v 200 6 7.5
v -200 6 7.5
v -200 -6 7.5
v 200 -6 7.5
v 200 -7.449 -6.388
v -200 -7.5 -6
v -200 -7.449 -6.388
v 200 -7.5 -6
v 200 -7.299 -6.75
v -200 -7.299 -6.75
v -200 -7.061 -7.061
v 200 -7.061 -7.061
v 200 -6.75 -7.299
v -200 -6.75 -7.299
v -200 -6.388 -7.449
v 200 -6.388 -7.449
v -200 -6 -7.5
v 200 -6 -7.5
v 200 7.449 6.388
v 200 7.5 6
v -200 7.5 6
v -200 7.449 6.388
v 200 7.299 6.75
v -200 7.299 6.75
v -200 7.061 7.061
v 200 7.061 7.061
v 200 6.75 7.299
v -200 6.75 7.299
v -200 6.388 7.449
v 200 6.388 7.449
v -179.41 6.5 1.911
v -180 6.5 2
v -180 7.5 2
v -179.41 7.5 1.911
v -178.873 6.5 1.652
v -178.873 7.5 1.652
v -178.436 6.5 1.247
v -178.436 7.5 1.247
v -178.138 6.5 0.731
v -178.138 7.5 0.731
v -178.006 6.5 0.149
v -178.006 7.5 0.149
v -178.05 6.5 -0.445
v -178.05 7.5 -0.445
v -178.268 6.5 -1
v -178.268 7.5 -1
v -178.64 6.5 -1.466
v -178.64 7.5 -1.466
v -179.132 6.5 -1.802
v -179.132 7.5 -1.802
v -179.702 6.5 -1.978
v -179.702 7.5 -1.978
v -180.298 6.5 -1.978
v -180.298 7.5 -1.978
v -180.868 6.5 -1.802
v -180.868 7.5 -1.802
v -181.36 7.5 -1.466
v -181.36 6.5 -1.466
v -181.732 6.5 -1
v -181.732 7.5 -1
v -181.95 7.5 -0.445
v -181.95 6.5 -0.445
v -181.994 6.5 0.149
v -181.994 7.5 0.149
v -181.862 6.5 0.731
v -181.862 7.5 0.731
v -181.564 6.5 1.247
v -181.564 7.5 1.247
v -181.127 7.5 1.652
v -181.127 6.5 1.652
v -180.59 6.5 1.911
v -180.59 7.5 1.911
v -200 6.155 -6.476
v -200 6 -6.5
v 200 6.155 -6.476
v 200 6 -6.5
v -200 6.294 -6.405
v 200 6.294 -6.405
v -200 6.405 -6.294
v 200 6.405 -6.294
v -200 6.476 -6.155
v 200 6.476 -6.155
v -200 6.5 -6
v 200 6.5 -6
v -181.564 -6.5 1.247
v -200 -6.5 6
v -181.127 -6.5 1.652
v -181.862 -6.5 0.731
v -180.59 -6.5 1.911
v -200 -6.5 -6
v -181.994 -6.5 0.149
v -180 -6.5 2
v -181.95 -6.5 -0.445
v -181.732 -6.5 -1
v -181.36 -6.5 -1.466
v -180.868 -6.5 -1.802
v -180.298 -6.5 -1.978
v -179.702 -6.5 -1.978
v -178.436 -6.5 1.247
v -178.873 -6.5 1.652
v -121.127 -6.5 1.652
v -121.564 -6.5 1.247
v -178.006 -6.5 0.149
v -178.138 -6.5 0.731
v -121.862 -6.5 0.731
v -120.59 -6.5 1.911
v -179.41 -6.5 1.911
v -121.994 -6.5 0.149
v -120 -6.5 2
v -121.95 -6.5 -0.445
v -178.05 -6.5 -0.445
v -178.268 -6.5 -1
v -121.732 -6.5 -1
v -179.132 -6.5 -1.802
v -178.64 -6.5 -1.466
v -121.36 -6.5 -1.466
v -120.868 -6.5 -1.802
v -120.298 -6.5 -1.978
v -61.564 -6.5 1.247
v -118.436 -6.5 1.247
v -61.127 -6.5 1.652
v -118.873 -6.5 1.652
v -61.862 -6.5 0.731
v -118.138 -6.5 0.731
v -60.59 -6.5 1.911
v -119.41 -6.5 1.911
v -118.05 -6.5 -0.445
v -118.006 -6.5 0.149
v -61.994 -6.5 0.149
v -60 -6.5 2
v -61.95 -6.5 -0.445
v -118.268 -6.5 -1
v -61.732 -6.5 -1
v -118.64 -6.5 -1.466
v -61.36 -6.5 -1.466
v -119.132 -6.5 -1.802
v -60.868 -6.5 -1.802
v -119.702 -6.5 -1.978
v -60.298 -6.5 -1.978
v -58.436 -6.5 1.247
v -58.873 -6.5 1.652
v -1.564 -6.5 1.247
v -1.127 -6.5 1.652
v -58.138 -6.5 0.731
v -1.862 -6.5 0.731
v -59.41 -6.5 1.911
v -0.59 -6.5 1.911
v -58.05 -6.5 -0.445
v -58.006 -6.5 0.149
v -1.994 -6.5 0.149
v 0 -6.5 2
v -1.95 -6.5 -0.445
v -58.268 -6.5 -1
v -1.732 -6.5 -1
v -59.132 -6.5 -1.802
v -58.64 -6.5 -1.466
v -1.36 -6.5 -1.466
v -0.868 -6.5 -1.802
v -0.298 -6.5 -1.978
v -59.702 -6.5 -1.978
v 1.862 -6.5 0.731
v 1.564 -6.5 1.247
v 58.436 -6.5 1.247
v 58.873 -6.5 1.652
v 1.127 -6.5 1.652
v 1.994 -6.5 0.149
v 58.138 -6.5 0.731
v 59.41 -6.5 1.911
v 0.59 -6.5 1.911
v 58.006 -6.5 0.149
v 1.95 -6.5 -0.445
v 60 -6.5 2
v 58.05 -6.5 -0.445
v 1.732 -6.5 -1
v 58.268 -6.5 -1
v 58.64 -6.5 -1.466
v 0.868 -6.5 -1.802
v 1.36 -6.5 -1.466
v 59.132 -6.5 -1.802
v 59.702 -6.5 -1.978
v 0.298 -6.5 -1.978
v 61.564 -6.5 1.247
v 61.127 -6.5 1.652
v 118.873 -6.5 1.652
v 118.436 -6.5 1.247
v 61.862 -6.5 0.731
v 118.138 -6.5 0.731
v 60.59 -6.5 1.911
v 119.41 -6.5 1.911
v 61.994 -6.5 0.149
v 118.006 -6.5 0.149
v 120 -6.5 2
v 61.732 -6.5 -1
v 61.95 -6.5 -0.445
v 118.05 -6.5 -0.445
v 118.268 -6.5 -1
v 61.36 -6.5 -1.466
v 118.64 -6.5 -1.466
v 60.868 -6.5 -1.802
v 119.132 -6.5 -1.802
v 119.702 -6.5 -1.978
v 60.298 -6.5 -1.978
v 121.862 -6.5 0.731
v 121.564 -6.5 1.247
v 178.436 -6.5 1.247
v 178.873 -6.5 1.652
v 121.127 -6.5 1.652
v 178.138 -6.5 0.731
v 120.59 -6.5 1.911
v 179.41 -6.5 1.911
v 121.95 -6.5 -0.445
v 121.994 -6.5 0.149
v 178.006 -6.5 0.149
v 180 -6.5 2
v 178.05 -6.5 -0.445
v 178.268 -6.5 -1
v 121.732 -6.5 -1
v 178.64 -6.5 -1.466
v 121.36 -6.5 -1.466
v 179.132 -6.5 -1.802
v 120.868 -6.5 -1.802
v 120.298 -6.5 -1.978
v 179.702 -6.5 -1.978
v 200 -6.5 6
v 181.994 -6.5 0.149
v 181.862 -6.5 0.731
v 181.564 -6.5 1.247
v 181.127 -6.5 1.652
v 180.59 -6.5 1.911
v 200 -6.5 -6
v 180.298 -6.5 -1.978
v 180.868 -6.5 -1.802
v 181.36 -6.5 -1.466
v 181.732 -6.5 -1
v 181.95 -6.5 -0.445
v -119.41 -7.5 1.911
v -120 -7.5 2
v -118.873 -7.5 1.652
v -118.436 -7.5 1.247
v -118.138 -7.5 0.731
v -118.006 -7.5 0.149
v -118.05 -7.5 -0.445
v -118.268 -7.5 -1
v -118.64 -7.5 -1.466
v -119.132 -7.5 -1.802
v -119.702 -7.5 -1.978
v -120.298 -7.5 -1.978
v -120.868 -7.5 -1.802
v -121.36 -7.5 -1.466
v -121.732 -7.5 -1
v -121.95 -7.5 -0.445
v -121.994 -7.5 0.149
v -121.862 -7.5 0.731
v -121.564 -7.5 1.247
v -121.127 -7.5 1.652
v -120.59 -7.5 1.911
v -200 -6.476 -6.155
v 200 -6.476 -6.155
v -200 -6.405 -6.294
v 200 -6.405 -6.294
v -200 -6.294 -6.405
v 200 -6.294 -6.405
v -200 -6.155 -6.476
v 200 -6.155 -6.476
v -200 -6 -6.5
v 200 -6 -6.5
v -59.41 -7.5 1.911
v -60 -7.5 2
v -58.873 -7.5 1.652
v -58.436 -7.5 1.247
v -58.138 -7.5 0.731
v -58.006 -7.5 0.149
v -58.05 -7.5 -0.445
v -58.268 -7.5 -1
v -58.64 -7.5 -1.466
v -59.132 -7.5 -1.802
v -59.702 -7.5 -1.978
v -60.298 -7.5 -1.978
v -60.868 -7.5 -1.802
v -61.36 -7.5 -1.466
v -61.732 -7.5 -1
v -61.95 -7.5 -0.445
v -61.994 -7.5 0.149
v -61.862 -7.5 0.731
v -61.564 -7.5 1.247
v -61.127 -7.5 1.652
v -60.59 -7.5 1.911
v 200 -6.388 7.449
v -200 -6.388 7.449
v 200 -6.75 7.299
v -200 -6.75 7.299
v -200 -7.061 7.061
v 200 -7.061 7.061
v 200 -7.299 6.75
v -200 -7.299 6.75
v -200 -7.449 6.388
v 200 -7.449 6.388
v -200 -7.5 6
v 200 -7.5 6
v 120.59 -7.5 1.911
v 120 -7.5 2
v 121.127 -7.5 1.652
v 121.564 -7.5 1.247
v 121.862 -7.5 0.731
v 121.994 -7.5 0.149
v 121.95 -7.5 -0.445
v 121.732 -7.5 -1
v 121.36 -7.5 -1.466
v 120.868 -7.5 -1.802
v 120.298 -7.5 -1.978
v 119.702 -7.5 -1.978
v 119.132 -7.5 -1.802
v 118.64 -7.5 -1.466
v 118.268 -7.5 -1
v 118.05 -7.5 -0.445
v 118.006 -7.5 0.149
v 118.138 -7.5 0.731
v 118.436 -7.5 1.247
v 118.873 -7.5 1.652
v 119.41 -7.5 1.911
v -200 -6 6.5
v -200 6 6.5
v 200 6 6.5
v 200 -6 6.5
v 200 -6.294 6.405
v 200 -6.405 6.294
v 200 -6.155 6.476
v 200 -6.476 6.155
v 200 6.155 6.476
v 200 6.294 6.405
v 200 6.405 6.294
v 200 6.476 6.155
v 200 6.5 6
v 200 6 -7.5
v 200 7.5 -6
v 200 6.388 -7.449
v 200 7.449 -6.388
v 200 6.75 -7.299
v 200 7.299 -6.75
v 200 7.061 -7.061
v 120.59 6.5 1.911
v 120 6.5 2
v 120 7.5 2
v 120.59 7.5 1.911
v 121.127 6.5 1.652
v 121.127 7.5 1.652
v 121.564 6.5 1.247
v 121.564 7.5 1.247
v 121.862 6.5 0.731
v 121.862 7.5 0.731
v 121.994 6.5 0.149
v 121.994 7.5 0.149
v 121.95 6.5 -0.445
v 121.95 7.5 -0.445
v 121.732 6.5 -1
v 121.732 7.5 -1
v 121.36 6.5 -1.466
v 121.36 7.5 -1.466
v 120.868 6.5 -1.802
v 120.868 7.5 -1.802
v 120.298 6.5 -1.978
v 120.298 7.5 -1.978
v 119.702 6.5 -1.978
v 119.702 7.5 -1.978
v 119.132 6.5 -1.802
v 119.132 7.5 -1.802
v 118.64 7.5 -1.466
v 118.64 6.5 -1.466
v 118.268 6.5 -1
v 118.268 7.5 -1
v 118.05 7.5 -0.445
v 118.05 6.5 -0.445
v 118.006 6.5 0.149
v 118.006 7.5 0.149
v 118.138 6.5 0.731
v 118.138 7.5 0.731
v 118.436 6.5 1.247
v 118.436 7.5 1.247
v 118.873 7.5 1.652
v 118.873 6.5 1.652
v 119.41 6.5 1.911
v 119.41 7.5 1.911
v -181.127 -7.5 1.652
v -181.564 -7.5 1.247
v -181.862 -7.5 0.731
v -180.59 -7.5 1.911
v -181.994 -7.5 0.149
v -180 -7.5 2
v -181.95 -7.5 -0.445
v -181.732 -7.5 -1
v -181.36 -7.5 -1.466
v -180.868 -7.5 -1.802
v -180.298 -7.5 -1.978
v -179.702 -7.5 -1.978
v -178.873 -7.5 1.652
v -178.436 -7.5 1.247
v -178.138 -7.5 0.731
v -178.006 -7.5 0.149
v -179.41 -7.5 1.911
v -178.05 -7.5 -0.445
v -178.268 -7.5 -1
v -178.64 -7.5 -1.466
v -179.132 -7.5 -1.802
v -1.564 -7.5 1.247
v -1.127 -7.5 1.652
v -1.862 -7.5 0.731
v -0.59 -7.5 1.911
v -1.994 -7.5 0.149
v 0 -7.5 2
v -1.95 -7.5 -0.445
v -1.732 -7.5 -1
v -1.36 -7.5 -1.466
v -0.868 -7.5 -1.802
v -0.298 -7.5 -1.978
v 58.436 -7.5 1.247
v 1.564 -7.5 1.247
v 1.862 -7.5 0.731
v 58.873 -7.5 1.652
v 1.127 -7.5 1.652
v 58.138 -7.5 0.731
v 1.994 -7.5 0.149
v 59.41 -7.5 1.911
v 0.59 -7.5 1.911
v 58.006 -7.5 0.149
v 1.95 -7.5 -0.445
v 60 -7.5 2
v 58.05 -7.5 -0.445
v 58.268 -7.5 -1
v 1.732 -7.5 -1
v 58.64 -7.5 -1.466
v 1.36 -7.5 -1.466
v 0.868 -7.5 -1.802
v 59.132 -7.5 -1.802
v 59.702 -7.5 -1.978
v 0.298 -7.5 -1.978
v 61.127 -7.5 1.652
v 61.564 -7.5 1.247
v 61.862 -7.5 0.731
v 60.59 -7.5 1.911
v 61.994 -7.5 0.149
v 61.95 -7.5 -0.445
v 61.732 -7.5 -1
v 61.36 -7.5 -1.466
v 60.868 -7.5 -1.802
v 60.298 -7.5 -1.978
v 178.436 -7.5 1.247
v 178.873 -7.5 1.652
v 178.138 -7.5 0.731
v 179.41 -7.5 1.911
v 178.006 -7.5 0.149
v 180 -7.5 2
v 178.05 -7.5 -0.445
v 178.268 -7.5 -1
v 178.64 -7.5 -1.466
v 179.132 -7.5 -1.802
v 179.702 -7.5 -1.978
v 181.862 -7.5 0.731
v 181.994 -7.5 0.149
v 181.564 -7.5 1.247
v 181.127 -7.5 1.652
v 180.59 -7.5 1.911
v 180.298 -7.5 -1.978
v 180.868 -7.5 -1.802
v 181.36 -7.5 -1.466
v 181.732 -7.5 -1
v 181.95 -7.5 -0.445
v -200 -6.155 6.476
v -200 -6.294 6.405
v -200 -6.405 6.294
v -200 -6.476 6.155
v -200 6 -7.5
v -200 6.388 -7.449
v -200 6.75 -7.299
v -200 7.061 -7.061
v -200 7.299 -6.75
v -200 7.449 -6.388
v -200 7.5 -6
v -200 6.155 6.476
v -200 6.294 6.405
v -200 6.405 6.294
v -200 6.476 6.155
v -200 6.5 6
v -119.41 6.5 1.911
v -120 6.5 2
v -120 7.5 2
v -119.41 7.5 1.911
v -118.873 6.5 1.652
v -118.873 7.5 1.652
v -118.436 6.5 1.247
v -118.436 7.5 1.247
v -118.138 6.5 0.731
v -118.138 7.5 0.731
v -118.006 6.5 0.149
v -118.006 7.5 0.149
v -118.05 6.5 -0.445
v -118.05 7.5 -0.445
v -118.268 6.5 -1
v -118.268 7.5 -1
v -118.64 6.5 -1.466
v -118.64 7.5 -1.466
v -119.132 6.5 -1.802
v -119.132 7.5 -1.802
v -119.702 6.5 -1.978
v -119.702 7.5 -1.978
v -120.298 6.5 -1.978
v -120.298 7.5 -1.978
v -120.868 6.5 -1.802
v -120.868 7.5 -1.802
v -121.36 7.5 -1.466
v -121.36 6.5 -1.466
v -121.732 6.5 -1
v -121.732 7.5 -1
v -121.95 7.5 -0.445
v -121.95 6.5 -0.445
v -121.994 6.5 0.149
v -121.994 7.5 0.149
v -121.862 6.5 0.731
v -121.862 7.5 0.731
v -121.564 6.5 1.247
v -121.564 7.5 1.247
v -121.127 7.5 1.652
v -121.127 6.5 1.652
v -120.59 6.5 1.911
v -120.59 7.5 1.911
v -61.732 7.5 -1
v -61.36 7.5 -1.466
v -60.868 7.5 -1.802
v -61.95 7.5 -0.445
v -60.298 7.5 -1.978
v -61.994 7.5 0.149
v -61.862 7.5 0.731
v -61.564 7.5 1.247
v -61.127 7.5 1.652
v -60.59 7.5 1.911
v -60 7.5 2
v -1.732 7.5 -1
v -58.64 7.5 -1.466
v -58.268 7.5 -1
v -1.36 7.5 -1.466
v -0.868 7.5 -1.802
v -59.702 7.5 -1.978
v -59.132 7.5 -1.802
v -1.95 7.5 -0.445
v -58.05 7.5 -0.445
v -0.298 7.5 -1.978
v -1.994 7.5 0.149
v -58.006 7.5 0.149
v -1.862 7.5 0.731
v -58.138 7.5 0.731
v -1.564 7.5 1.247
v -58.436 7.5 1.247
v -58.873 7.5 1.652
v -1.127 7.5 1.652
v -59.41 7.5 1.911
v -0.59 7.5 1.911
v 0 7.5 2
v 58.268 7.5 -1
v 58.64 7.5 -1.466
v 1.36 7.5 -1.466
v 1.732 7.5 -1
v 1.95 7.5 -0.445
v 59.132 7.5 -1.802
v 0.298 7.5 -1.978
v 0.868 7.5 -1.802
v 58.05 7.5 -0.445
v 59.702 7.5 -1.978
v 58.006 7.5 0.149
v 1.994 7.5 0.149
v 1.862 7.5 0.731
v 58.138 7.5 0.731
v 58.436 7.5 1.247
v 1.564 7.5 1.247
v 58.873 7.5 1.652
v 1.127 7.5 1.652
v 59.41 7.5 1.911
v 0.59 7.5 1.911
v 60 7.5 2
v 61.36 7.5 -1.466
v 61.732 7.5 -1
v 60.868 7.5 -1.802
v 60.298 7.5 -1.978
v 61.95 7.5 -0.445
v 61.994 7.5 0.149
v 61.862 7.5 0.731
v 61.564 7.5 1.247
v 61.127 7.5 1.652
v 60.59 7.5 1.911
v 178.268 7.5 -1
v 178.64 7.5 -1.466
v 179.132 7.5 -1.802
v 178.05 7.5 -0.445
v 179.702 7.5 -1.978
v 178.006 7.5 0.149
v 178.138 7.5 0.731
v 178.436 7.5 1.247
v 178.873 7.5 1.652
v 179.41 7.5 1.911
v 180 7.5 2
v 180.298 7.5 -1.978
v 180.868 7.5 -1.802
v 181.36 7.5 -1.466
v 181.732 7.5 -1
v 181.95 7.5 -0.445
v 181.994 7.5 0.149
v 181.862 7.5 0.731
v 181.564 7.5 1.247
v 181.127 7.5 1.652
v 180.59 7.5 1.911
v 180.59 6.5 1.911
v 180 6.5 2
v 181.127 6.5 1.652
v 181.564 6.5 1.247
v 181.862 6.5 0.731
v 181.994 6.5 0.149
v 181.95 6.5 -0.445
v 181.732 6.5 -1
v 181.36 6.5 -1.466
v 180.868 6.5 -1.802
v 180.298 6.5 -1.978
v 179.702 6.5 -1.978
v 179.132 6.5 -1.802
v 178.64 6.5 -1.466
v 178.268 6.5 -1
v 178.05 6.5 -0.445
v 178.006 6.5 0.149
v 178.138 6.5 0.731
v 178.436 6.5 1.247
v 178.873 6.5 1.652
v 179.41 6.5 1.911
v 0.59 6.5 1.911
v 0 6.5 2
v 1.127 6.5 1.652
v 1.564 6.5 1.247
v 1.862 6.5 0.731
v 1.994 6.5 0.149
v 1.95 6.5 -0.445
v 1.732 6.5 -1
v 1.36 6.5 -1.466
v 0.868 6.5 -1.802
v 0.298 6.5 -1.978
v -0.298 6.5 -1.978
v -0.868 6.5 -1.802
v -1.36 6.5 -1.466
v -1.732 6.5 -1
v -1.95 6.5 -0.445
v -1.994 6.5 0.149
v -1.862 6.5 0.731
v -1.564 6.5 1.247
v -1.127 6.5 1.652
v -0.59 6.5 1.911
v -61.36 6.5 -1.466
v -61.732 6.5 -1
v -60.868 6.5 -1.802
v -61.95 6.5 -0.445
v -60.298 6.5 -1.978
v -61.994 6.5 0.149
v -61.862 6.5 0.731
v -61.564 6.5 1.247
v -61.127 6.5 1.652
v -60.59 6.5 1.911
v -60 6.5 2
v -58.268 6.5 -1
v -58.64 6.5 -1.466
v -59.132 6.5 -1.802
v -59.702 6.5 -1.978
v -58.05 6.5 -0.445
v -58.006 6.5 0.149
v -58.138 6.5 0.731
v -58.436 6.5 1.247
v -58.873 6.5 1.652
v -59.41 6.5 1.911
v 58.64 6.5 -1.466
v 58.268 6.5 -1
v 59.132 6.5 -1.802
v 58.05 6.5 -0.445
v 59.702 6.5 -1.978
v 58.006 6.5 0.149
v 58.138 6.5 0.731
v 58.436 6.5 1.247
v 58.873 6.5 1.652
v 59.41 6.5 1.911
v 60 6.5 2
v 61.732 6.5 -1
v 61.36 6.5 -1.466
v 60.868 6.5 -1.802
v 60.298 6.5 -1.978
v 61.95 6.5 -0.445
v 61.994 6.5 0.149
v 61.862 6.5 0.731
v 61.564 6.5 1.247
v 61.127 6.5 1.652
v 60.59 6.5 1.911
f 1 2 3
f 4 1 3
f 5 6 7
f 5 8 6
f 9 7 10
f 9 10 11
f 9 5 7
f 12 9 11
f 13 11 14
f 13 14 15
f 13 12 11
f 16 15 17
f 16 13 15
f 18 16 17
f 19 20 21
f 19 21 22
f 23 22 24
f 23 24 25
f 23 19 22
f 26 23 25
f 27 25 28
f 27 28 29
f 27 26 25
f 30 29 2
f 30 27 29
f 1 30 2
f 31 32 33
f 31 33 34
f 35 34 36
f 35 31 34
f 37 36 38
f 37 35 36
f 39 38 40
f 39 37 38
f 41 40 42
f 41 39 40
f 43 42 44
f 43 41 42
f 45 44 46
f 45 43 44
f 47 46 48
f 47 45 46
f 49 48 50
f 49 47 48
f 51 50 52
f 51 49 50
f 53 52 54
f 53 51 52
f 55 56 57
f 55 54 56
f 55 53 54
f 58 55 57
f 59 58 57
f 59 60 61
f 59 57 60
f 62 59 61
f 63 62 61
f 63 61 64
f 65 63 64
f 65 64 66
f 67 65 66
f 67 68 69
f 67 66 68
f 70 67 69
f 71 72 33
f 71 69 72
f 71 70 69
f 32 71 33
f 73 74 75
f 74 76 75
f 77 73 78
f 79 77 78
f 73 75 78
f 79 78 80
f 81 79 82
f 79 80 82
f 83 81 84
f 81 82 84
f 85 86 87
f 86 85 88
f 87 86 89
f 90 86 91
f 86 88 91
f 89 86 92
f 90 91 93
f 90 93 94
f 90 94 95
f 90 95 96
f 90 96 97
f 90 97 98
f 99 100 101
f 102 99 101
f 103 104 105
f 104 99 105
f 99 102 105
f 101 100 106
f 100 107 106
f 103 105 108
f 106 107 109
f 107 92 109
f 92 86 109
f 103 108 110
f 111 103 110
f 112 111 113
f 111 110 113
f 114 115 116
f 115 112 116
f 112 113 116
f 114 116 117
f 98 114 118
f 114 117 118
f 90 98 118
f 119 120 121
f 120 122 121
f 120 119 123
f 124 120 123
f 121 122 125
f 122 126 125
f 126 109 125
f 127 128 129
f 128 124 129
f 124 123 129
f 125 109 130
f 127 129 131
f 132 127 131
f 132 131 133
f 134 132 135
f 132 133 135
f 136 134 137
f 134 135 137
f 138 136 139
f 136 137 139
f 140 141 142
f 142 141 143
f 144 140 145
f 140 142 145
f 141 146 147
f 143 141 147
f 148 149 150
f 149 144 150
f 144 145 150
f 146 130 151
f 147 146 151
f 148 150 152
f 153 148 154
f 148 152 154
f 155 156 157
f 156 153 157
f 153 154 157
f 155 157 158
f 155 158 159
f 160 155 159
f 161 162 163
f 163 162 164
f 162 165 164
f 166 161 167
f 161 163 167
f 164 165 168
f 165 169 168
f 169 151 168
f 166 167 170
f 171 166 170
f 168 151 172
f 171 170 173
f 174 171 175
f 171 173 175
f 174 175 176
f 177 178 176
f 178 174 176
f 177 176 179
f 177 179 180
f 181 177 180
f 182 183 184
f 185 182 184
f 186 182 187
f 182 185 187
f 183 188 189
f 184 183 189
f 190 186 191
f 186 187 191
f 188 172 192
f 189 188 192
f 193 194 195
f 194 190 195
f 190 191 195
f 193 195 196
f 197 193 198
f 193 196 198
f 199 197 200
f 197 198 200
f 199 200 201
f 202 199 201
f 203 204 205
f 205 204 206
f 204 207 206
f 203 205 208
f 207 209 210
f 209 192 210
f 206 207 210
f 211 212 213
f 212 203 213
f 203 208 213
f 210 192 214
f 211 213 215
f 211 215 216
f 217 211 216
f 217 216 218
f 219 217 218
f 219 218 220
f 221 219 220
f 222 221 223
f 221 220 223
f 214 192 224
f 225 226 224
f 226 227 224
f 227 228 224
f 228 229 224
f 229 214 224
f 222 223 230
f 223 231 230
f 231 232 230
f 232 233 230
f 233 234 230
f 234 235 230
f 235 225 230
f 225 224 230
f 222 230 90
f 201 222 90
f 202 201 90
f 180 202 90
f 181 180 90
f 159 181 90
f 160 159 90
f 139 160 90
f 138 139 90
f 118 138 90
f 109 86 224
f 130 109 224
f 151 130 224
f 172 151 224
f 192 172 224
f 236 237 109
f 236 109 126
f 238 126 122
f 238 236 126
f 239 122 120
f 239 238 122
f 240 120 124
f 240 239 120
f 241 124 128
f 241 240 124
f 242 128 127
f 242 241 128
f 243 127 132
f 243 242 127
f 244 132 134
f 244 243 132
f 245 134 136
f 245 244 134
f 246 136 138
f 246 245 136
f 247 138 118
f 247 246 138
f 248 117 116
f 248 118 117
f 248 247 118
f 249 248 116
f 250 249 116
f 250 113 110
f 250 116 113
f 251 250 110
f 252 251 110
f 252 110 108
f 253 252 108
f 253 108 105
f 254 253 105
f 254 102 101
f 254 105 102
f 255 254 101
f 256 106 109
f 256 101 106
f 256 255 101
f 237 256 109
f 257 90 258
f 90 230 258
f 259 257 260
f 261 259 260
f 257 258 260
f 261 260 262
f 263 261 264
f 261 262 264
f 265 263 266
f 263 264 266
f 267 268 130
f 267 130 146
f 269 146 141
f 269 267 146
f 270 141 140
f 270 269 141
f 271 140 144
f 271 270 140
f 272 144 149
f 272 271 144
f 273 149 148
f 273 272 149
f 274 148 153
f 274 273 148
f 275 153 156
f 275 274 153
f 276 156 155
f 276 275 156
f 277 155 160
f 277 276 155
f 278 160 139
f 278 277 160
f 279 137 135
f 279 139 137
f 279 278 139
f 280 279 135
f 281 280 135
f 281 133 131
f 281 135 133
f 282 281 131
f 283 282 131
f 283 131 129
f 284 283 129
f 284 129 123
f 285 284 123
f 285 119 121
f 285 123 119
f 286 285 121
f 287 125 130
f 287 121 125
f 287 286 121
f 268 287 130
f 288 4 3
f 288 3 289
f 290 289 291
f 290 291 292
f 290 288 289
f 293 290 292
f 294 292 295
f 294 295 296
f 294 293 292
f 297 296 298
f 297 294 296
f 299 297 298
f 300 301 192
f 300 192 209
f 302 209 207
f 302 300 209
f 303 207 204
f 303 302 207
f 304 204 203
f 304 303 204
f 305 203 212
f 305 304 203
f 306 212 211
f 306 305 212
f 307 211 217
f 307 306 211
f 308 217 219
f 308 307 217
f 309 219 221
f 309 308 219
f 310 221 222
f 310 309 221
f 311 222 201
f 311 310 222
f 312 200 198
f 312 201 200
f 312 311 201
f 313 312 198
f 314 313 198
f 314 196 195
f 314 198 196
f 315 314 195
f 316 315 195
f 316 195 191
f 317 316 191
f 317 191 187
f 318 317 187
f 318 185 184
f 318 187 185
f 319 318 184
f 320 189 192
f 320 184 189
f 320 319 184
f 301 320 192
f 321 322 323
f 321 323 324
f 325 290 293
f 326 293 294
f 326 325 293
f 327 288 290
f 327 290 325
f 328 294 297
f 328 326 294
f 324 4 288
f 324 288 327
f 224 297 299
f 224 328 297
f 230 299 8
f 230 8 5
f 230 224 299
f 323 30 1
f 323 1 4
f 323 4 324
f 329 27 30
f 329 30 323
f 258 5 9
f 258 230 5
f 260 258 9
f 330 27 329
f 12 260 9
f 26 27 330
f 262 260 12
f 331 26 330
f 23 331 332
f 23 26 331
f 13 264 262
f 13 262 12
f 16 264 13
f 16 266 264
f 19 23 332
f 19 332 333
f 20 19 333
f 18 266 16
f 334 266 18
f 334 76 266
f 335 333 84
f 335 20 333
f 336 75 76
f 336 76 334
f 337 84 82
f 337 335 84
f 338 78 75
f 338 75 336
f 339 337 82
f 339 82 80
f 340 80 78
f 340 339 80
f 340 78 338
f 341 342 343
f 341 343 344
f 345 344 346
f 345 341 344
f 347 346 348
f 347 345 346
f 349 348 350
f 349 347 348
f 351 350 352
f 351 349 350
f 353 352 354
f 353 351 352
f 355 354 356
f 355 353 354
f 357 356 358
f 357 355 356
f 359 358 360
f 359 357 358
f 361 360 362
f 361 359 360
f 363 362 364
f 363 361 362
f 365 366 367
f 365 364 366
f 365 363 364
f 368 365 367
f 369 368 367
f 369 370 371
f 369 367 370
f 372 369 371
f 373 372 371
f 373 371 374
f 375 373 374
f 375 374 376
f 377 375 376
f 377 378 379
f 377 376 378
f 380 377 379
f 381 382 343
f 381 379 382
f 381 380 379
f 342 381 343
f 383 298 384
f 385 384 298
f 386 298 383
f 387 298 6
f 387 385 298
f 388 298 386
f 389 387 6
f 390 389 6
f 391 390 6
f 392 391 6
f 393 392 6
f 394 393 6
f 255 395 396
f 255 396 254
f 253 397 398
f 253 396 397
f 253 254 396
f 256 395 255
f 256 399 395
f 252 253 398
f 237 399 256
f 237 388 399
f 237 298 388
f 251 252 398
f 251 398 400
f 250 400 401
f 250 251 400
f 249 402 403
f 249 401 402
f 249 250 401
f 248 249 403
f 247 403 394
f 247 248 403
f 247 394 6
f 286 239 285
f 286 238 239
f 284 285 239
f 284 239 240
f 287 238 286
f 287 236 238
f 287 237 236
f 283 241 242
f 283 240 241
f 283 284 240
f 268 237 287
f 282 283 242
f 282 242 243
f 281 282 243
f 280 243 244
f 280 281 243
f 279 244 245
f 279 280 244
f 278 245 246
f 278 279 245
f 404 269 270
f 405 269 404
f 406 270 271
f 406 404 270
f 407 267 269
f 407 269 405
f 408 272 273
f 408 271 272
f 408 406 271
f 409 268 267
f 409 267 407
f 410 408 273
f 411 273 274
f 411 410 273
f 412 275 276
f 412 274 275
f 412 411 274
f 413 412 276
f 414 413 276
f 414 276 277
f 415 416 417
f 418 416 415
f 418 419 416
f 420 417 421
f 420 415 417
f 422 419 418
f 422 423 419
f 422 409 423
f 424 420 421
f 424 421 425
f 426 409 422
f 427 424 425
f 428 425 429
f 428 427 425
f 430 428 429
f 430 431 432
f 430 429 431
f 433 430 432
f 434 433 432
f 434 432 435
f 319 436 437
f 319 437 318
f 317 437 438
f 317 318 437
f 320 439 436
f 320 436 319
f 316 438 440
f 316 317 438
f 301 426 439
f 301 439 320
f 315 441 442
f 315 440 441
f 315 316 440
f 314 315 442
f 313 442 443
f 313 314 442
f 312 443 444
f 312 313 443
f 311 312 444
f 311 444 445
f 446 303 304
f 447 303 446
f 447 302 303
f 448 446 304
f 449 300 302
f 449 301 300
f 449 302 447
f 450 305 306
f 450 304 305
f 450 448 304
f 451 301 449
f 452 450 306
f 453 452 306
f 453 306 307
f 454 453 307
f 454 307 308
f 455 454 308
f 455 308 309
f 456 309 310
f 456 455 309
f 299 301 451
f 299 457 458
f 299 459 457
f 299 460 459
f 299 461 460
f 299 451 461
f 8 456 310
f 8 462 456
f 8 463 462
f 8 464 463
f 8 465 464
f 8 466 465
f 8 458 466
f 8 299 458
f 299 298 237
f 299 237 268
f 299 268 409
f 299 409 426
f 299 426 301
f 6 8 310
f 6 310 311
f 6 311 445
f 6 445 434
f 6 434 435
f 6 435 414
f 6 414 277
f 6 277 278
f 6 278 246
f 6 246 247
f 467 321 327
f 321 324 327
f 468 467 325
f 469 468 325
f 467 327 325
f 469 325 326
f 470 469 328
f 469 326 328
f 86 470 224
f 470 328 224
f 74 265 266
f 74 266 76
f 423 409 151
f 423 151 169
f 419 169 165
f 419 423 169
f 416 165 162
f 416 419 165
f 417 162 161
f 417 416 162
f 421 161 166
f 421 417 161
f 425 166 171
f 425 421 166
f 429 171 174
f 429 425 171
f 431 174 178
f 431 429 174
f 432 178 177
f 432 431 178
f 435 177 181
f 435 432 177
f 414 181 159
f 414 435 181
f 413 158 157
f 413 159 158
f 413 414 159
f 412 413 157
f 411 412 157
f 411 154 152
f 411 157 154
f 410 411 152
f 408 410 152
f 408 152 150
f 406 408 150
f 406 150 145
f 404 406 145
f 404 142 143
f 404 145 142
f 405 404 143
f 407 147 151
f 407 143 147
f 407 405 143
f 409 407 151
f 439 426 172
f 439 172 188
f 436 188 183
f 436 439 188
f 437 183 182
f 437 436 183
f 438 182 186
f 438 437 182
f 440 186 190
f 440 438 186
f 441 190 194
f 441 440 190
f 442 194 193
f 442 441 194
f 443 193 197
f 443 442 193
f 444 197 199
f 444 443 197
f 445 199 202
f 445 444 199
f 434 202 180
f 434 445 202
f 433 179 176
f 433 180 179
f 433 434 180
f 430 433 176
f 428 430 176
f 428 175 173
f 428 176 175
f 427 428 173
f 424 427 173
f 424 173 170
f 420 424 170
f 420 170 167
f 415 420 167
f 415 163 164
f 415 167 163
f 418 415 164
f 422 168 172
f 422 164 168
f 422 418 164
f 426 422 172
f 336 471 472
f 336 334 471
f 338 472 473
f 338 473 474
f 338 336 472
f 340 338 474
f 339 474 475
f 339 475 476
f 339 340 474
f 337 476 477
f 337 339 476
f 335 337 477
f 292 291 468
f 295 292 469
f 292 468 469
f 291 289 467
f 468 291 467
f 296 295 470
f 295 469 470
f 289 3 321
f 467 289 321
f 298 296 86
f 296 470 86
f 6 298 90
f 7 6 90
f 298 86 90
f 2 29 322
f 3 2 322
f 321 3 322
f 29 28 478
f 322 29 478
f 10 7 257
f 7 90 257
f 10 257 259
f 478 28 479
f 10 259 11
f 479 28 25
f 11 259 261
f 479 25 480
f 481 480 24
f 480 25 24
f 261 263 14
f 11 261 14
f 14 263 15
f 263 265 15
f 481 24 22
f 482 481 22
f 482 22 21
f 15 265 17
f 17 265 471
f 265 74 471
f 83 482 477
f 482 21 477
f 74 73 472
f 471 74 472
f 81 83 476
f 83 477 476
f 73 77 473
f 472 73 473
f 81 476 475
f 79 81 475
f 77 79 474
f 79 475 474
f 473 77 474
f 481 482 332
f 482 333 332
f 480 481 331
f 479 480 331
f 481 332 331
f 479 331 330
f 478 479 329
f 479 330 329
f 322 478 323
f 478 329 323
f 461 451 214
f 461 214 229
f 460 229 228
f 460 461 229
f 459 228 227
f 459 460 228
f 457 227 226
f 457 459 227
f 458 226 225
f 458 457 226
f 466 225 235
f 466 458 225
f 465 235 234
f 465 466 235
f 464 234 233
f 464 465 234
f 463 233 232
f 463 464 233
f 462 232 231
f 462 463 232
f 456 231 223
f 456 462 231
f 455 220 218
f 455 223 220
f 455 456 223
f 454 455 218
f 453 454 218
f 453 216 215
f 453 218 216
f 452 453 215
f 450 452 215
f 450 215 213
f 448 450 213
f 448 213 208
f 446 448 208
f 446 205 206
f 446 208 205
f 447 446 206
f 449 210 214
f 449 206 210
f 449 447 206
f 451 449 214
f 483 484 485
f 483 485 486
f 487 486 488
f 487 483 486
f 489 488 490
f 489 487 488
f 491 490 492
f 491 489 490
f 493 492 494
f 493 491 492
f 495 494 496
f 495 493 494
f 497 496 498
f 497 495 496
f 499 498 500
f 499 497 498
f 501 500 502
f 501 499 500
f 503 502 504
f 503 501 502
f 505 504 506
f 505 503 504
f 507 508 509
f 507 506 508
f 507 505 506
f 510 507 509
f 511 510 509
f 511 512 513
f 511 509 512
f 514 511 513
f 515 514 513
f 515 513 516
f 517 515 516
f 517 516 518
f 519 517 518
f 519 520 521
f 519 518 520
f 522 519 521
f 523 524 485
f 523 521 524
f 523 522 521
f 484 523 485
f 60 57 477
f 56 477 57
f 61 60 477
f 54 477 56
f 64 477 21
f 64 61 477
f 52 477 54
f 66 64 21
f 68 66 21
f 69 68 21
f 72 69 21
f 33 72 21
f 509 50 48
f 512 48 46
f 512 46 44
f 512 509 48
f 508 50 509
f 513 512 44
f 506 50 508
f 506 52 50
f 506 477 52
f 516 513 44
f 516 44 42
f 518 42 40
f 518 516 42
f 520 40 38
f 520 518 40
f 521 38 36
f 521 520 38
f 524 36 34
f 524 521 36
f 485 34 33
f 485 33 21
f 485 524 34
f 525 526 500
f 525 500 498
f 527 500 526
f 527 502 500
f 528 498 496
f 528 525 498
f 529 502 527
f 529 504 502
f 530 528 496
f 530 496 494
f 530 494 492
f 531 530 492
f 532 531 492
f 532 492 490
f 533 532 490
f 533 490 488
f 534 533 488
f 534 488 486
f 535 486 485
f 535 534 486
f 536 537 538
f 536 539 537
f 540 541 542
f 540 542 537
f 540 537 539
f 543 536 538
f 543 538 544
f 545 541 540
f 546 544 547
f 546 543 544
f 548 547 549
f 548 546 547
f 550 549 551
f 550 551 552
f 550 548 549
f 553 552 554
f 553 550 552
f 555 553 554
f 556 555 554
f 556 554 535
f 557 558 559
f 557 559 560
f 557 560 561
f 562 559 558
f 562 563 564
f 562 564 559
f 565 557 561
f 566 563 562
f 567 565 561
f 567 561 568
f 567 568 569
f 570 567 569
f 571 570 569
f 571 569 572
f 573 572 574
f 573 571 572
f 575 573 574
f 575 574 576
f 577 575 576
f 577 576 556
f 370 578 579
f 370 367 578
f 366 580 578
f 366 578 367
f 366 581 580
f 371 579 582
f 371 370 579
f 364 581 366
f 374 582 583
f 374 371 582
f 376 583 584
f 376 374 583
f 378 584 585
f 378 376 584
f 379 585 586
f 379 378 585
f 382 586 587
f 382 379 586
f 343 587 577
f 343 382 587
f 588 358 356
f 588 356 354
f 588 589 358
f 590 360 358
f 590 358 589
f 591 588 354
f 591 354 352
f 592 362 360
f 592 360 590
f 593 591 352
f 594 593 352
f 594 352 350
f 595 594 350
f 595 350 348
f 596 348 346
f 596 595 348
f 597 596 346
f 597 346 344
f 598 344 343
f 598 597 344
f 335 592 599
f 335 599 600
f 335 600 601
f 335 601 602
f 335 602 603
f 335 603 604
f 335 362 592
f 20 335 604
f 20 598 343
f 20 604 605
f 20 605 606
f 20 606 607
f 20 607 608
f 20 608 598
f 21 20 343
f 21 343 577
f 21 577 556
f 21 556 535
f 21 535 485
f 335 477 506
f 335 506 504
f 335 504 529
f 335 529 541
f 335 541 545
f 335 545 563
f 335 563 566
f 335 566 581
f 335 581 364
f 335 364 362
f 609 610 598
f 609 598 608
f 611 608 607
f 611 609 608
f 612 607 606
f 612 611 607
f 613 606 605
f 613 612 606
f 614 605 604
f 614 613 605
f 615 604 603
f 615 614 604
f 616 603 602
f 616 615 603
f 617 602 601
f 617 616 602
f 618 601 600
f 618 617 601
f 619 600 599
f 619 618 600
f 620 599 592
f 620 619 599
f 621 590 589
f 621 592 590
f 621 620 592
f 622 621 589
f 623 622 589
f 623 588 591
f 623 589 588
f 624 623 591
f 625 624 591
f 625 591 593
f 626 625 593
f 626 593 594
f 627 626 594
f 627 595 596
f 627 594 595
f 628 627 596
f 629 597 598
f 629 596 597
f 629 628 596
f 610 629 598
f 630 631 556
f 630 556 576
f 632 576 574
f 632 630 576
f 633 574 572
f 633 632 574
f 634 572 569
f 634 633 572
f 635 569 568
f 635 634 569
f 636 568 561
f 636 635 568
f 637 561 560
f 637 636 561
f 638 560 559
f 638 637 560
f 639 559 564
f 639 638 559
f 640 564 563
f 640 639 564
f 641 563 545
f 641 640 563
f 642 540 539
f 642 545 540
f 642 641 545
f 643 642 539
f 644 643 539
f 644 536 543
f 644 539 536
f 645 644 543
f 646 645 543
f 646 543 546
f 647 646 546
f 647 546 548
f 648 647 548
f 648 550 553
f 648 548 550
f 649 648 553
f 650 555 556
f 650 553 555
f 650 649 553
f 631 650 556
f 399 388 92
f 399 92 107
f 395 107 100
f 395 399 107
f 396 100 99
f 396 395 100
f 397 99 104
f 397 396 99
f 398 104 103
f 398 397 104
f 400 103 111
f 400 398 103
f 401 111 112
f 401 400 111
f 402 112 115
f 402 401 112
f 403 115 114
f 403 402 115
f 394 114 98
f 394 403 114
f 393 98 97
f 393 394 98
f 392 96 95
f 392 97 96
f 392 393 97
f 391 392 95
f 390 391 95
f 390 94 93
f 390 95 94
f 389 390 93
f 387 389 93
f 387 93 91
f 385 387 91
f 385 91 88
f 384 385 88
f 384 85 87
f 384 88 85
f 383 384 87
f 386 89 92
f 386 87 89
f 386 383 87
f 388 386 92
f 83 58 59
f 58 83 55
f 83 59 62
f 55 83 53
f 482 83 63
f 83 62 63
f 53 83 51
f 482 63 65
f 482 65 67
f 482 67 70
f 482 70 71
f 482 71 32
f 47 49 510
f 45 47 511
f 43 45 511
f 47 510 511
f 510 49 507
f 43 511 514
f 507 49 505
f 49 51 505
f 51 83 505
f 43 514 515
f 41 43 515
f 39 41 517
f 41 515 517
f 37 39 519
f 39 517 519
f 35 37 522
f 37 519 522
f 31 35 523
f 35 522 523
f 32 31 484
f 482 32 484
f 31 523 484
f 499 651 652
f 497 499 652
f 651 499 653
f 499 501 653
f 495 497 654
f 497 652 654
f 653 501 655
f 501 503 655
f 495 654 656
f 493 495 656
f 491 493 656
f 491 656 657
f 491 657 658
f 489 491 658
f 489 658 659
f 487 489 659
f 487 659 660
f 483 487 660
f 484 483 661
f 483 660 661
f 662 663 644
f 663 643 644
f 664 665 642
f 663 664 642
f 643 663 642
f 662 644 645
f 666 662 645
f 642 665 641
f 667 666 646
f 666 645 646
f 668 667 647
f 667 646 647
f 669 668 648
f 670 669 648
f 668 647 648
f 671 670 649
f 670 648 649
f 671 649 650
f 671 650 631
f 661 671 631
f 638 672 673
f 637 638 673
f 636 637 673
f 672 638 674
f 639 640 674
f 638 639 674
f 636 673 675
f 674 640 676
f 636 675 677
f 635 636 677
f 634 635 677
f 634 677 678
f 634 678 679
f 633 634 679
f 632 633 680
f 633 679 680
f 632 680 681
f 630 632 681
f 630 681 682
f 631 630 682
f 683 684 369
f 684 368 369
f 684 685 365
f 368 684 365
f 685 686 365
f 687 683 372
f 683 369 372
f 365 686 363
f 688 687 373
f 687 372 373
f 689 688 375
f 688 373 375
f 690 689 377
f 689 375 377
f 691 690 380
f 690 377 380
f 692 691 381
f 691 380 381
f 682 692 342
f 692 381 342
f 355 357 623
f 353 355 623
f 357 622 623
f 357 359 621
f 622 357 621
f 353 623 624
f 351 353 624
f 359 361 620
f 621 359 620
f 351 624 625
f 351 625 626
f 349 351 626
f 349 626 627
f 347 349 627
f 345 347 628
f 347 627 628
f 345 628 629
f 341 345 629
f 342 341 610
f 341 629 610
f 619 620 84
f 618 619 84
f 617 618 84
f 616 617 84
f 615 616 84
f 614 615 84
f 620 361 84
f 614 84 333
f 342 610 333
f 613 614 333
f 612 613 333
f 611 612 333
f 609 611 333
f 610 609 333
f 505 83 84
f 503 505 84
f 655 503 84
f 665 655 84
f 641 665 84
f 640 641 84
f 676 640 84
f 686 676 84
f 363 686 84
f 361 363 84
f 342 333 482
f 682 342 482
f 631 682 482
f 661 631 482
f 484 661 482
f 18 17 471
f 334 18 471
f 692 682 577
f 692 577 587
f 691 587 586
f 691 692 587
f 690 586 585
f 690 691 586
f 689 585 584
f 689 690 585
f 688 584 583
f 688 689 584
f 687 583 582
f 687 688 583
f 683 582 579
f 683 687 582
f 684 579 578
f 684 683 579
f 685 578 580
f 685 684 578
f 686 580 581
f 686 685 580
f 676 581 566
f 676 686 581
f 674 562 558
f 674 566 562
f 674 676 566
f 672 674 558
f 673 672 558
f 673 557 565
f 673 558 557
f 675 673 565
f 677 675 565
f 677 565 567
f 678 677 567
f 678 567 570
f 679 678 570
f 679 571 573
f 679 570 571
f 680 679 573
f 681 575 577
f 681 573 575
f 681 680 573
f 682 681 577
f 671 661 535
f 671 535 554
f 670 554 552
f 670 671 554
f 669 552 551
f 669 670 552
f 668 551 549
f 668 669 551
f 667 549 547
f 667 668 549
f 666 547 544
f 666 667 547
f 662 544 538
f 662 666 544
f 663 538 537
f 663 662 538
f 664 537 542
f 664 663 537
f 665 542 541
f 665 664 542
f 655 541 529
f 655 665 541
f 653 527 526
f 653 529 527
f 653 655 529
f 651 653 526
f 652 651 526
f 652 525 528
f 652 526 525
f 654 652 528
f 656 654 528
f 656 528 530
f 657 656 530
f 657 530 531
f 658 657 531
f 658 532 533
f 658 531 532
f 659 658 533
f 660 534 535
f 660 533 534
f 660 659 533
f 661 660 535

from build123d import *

# Parameters (mm, degrees)
EXTRUDE_1_DEPTH          = 200
CUT_EXTRUDE_1_DEPTH      = 201.281052524
CUT_EXTRUDE_1_DEPTH_BACK = 201.281052524
SKETCH_2_R               = 2


with BuildPart() as part:
    # 草图1 → 凸台-拉伸1 (new, symmetric)
    with BuildSketch(Plane(origin=(0, 0, 0), x_dir=(0, 0, -1), z_dir=(1, 0, 0))):
        with BuildLine():
            Line((6, 7.5), (-6, 7.5))
            ThreePointArc((-6, 7.5), (-7.060660172, 7.060660172), (-7.5, 6))
            Line((-7.5, 6), (-7.5, -6))
            ThreePointArc((-7.5, -6), (-7.060660172, -7.060660172), (-6, -7.5))
            Line((-6, -7.5), (6, -7.5))
            ThreePointArc((6, -7.5), (7.060660172, -7.060660172), (7.5, -6))
            Line((7.5, -6), (7.5, 6))
            ThreePointArc((7.5, 6), (7.060660172, 7.060660172), (6, 7.5))
        make_face()
        with BuildLine():
            Line((6, 6.5), (-6, 6.5))
            ThreePointArc((-6, 6.5), (-6.353553391, 6.353553391), (-6.5, 6))
            Line((-6.5, 6), (-6.5, -6))
            ThreePointArc((-6.5, -6), (-6.353553391, -6.353553391), (-6, -6.5))
            Line((-6, -6.5), (6, -6.5))
            ThreePointArc((6, -6.5), (6.353553391, -6.353553391), (6.5, -6))
            Line((6.5, -6), (6.5, 6))
            ThreePointArc((6.5, 6), (6.353553391, 6.353553391), (6, 6.5))
        make_face(mode=Mode.SUBTRACT)
    extrude(amount=EXTRUDE_1_DEPTH, both=True)

    # 草图2 → 切除-拉伸1 (cut, two sides: drawn at the far end of the back side and taken through both)
    with BuildSketch(Plane(origin=(0, 0, 0), x_dir=(1, 0, 0), z_dir=(0, 1, 0)).offset(-CUT_EXTRUDE_1_DEPTH_BACK)):
        with Locations(Location((-180, 0, 0), (0, 0, 270))):
            Circle(SKETCH_2_R)
        with Locations(Location((-120, 0, 0), (0, 0, 270))):
            Circle(SKETCH_2_R)
        with Locations(Location((-60, 0, 0), (0, 0, 270))):
            Circle(SKETCH_2_R)
        with Locations(Location((0, 0, 0), (0, 0, 270))):
            Circle(SKETCH_2_R)
        with Locations(Location((60, 0, 0), (0, 0, 270))):
            Circle(SKETCH_2_R)
        with Locations(Location((120, 0, 0), (0, 0, 270))):
            Circle(SKETCH_2_R)
        with Locations(Location((180, 0, 0), (0, 0, 270))):
            Circle(SKETCH_2_R)
    extrude(amount=CUT_EXTRUDE_1_DEPTH + CUT_EXTRUDE_1_DEPTH_BACK, mode=Mode.SUBTRACT)


solid = part.part
